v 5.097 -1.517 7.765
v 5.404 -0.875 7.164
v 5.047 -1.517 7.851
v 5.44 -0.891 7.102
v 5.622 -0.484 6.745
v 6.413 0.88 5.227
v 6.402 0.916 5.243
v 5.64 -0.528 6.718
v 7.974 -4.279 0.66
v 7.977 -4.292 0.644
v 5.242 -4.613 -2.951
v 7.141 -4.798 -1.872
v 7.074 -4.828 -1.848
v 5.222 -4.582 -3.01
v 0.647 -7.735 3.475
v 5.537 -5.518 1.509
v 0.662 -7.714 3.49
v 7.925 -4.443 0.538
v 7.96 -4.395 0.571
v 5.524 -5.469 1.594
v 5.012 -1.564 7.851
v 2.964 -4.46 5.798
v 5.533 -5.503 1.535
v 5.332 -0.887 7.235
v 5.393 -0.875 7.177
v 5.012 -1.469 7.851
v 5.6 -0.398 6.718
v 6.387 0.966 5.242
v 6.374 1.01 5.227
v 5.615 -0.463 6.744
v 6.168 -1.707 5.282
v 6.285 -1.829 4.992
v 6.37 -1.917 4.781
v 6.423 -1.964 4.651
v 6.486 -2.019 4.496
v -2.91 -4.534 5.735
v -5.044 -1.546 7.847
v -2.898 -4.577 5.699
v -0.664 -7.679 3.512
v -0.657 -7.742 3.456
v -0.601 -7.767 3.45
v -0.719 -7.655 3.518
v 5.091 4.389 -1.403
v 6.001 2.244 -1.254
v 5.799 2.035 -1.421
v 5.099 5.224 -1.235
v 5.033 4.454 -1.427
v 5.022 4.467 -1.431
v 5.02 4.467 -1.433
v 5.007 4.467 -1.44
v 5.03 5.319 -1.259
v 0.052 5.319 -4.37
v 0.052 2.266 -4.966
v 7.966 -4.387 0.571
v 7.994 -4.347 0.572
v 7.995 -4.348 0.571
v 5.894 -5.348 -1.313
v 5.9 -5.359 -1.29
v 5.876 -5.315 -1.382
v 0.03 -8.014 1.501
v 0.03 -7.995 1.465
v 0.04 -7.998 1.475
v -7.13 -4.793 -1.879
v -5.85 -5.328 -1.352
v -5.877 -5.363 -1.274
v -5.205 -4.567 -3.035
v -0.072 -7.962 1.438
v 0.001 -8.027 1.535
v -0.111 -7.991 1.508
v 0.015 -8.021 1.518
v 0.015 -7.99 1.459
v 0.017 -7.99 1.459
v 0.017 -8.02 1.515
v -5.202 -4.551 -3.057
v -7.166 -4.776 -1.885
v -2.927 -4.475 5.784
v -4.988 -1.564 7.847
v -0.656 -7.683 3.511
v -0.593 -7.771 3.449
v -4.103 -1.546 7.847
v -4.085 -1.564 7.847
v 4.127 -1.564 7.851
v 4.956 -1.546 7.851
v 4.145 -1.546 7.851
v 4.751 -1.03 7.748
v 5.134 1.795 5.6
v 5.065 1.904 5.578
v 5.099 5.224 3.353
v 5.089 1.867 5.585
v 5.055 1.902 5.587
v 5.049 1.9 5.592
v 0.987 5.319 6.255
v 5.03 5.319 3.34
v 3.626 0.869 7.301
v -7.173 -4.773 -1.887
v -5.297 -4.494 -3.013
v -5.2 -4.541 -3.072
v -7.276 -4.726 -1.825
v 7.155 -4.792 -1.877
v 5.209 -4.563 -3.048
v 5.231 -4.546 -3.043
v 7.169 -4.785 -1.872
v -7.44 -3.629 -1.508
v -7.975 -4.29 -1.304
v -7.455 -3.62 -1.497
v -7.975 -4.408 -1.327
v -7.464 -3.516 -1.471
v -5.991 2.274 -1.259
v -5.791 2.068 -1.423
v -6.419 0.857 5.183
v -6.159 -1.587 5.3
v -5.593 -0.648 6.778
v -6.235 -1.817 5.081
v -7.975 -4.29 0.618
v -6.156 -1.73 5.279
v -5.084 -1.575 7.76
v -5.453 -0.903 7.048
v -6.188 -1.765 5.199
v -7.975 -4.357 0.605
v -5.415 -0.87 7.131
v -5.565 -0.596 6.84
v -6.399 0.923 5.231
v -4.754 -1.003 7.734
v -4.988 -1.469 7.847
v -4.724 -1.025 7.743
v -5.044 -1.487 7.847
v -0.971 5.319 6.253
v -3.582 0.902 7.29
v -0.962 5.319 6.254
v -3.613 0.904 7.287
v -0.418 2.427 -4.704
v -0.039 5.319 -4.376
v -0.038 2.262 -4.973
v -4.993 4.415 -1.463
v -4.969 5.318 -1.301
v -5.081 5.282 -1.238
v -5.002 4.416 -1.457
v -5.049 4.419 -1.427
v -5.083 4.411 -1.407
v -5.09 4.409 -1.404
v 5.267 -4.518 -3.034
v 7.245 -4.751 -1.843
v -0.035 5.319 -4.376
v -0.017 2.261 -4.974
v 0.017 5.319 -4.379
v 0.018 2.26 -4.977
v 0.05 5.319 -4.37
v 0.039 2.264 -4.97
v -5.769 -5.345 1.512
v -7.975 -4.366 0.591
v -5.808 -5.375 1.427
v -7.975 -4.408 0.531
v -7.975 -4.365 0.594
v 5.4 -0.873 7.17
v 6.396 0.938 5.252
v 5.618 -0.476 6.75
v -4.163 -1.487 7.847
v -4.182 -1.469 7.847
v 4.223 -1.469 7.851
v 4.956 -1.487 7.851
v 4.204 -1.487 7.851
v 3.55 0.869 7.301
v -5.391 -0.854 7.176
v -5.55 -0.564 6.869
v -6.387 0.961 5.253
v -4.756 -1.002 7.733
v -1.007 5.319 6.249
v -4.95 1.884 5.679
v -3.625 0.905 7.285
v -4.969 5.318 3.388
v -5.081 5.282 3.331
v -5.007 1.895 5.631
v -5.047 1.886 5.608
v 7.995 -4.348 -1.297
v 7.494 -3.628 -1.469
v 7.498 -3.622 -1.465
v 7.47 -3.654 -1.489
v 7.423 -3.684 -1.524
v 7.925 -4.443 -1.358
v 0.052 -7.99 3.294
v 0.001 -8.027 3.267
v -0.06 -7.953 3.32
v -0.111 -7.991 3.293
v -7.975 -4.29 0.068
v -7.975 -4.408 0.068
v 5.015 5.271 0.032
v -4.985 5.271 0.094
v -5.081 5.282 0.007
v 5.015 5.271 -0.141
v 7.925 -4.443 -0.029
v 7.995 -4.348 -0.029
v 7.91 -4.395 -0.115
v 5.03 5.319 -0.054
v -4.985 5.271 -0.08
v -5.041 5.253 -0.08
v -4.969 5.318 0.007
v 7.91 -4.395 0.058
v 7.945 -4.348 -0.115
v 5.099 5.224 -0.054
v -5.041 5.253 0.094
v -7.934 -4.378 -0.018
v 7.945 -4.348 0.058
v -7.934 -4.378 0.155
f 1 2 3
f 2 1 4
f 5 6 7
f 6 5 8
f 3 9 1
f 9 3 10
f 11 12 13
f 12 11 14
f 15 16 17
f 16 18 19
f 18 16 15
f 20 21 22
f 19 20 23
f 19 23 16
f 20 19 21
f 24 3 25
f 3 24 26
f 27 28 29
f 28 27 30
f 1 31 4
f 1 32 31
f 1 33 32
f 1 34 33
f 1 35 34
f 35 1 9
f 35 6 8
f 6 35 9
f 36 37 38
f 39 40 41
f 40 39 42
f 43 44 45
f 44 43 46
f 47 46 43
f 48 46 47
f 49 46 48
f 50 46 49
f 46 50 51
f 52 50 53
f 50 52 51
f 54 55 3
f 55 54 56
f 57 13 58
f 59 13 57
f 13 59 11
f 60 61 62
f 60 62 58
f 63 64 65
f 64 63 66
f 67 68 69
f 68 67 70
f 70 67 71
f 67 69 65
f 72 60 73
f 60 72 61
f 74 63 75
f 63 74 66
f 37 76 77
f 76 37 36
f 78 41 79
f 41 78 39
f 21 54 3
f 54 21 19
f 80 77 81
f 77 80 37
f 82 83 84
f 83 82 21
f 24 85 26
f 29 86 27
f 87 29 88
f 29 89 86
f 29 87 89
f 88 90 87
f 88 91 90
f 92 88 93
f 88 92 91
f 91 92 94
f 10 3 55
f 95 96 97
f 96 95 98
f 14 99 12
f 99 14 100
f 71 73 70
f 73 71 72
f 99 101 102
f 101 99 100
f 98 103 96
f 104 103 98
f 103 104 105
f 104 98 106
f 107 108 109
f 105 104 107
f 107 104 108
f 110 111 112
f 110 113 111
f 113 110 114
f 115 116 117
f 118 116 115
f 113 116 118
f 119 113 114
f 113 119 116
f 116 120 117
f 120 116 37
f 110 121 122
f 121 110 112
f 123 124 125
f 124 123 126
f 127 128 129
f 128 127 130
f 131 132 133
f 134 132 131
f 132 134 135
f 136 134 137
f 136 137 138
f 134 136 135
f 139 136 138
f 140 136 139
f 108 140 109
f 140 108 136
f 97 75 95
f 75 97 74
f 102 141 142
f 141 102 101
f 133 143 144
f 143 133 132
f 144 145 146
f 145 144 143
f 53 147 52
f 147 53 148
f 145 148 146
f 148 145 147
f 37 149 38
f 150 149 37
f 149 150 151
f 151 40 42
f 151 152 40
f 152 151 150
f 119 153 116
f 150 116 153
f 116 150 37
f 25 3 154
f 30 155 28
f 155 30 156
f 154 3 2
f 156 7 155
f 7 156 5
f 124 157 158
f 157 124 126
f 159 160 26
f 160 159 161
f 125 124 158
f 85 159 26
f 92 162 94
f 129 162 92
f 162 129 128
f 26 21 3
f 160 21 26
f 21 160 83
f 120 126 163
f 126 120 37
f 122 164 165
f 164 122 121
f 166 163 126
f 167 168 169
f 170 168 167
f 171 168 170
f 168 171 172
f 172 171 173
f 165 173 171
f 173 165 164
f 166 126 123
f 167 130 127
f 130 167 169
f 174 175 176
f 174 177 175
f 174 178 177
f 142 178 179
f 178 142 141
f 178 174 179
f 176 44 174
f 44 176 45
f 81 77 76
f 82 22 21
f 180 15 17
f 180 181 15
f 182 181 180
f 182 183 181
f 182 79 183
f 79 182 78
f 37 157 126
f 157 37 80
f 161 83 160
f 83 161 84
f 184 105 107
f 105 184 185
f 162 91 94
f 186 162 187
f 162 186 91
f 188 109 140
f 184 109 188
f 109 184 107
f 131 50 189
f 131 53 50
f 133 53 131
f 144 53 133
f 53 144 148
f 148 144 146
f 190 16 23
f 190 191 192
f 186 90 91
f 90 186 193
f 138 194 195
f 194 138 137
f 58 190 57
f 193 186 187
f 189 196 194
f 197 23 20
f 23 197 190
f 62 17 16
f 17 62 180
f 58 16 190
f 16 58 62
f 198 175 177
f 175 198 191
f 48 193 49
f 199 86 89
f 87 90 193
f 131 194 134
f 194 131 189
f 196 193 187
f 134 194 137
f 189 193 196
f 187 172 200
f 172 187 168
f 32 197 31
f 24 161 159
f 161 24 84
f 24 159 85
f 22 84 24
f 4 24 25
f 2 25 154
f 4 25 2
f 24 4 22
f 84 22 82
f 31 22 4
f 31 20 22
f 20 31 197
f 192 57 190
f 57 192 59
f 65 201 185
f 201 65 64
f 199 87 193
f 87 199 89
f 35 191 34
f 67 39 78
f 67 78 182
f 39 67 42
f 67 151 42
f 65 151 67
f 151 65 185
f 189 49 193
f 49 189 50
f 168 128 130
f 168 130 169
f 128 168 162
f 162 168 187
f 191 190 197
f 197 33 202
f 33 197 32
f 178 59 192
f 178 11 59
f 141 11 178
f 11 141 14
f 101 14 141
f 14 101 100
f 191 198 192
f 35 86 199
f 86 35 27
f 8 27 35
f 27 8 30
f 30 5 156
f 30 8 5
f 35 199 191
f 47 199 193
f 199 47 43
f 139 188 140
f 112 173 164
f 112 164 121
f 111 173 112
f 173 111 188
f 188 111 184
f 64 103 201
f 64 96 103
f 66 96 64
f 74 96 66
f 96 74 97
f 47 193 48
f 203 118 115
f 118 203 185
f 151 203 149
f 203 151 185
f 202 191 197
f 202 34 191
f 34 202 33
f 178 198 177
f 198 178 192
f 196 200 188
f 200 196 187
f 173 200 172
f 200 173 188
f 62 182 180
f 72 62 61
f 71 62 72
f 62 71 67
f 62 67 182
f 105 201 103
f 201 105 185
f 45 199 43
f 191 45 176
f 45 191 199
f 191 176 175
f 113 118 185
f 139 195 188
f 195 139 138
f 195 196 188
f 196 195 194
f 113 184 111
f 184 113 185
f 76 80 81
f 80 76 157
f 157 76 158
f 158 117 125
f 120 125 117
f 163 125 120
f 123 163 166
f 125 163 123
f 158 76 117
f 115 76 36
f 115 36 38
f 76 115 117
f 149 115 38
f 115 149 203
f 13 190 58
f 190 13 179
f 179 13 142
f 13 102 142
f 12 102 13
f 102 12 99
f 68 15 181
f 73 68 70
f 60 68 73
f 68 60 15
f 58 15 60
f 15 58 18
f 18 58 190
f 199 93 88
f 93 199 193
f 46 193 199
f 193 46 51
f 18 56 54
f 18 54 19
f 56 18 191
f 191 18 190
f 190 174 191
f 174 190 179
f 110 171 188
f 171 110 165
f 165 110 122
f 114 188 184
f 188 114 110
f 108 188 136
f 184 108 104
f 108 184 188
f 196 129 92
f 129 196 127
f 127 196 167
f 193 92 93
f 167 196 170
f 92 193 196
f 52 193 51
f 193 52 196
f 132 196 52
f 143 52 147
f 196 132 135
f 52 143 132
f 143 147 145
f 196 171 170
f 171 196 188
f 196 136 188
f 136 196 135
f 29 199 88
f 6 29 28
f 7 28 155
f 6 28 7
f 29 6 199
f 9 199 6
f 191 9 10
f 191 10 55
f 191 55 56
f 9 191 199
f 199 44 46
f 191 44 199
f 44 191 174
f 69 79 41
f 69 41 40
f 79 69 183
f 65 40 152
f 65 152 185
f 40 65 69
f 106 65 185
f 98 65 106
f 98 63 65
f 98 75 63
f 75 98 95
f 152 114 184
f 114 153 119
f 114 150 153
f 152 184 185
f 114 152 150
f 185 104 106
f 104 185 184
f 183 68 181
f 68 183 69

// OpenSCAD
// Auto-generated OpenSCAD file

    inner_points = 10*[[-0.49475772011132046, 0.003839472954238088, 0.8557705860181677], [0.505223446776251, 0.0038995730095640058, 0.8496336276384451], [-0.505223446776251, -0.0038995730095640058, -0.8496336276384451], [0.49475772011132046, -0.003839472954238088, -0.8557705860181677], [0.003137871696801686, -0.788661439733275, 0.5035742160091927], [-0.002998750789873661, -0.7931992616167778, -0.49639665858516746], [-0.5000365230269928, 0.5223214995430275, 0.0006983537803530961], [0.4999446438605786, 0.5223815995983536, -0.00543860459936947], [-0.789374516264686, -0.4348859382371884, 0.006817726903340358], [0.7894510022985628, -0.43479104894911214, -0.0028716420739015092]];

    outer_points = 10*[[0.8526836986618631, 0.4907220093236373, 0.09625829137218865], [0.8527700142393673, -0.4907220093236373, -0.09549058296899036], [-0.8527700142393673, 0.4907220093236373, 0.09549058296899036], [-0.8526836986618631, -0.4907220093236373, -0.09625829137218865], [0.49965051582430237, -0.15166158156646264, 0.7764868514685156], [-0.5003493828586203, -0.15166158156646264, 0.7760367024438842], [0.00018761744828893297, 0.5908833725510971, -0.4167895941433019], [0.00027393302579300583, -0.3905606460961775, -0.6085384684844809], [-0.0002602518163823537, 0.6913983635916522, 0.578145848983155], [-0.0001239720133965481, -0.8581596810908002, 0.27540213141105363]];

    // Convex hull for inner set (I)
    module inner_hull() {
        hull() {
            for (p = inner_points) {
                translate(p) sphere(r=0.1);
            }
        }
    }

    // Convex hull for outer set (O) minus inner hull (O \ I)
    module outer_minus_inner() {
        difference() {
            hull() {
                for (p = outer_points) {
                    translate(p) sphere(r=0.1);
                }
            }
            inner_hull(); // Subtract inner hull
        }
    }

    // Convex hull for outer set (O) minus all translated inner hulls
    module outer_minus_AllTranslationInner() {
        difference() {
            hull() {
                for (p = outer_points) {
                    translate(p) sphere(r=0.1);
                }
            }
            hull() {
                translate([0,0,50]) inner_hull();
                translate([0,0,-50]) inner_hull();
            }; // Subtract translated inner hulls
        }
    }

    // Difference between outer_minus_inner and outer_minus_AllTranslationInner
    module outer_minus_inner_diff() {
        difference() {
            // Outer minus inner
            difference() {
                hull() {
                    for (p = outer_points) {
                        translate(p) sphere(r=0.1);
                    }
                }
                inner_hull();
            }

            // Subtract Outer minus AllTranslationInner
            difference() {
                hull() {
                    for (p = outer_points) {
                        translate(p) sphere(r=0.1);
                    }
                }
                hull() {
                    translate([0,0,50]) inner_hull();
                    translate([0,0,-50]) inner_hull();
                };
            }
        }
    }

    // Rendering all with colors applied
    color([1, 1, 0, 1]) outer_minus_inner_diff(); // Opaque yellow
    
